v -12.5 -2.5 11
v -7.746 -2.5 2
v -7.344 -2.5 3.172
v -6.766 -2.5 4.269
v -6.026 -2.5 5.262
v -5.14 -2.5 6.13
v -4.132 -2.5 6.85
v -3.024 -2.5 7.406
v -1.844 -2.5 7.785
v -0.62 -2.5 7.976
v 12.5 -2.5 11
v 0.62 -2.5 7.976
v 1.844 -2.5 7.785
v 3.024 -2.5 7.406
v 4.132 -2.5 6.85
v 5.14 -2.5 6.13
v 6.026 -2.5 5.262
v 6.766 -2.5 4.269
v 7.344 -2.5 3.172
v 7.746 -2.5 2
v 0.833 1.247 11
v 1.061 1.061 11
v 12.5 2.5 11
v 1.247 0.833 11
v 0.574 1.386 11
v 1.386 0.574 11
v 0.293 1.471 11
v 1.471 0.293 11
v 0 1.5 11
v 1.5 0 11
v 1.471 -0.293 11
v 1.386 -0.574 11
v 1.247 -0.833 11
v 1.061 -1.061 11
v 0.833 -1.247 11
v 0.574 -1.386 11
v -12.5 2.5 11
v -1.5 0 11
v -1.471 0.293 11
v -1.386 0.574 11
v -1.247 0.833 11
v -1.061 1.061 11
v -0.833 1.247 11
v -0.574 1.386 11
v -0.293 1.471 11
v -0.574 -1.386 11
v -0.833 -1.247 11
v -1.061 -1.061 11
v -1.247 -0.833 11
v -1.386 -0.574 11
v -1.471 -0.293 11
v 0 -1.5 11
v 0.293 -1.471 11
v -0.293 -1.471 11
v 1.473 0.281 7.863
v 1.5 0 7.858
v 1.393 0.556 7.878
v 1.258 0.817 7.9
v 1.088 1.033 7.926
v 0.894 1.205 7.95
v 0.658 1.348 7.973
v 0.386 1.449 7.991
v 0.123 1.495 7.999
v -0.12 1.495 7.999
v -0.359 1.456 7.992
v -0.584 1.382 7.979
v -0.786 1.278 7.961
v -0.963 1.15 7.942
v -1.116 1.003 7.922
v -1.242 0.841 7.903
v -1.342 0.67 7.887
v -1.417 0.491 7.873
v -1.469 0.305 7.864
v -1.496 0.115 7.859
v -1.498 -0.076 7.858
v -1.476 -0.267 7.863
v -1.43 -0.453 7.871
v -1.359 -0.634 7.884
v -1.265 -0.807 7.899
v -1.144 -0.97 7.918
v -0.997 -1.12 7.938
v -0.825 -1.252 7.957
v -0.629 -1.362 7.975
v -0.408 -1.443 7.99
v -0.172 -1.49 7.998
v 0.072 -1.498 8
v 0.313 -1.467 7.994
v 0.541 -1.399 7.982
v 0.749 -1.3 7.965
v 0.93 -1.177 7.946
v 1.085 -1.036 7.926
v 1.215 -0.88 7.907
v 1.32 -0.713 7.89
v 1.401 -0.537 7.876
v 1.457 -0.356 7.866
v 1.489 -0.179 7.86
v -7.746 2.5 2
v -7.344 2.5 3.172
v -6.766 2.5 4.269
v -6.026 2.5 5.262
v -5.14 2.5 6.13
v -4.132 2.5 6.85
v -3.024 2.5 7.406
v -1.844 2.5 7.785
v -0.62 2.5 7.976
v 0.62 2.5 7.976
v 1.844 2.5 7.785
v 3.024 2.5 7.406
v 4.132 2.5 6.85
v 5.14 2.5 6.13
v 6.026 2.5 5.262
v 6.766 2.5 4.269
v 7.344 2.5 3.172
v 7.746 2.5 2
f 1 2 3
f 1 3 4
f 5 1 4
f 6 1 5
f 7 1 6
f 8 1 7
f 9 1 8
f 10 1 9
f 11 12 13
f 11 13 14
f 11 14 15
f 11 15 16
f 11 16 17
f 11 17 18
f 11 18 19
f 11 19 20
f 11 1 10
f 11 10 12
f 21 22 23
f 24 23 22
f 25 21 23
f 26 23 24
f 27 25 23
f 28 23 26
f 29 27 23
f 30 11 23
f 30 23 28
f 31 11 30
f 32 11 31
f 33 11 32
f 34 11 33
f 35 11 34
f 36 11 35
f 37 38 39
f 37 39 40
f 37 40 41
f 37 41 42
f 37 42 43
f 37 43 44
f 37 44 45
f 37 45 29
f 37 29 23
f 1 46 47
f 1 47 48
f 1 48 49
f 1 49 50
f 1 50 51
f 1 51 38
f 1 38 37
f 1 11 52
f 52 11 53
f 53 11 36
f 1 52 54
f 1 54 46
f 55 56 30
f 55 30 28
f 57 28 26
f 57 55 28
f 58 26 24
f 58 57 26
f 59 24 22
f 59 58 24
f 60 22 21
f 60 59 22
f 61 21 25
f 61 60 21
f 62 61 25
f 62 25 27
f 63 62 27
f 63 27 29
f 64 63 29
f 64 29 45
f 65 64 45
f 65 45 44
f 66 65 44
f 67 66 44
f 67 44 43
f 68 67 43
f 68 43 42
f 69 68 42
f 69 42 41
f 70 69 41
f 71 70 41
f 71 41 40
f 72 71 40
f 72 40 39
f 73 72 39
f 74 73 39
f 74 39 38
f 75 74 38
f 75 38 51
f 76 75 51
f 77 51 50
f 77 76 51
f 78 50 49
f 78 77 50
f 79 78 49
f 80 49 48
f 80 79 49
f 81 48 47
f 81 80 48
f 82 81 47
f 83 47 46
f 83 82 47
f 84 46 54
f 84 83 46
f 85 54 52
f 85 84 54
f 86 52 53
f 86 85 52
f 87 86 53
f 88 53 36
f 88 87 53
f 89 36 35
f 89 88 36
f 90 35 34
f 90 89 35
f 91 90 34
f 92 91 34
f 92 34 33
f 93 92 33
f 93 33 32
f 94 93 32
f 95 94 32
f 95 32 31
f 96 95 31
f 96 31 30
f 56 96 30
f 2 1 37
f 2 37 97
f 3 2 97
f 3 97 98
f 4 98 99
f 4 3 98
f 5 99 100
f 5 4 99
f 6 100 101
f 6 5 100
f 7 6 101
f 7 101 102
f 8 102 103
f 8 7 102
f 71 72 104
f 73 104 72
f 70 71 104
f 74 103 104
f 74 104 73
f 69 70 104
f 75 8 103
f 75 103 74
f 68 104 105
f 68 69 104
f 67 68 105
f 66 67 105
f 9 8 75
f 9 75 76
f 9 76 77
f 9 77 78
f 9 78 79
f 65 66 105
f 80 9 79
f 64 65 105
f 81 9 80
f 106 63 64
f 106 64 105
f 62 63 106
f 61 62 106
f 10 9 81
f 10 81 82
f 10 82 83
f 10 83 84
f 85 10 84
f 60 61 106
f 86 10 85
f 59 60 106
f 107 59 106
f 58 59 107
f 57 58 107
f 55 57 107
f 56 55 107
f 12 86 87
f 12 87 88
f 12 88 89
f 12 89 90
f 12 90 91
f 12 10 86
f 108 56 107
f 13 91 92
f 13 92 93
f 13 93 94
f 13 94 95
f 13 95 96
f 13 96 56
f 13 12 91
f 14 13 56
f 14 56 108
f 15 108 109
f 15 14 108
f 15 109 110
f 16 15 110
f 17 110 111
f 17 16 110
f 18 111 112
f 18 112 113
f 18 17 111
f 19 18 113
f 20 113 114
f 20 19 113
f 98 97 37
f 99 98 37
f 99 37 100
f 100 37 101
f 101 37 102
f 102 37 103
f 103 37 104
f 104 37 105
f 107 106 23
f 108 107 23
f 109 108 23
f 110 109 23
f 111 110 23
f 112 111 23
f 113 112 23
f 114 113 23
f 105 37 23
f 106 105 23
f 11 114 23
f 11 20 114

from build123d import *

# Parameters (mm, degrees)
F1_DEPTH = 2.5
F2_R     = 1.5
F3_DEPTH = 11.001


# Not quite as in the source:
# - a feature names something its author has since deleted; it is built from what else it names


with BuildPart() as f1:
    # F0 (on Front) → F1 (new body, symmetric)
    with BuildSketch(Plane.XZ):
        with BuildLine():
            Line((12.5, 11), (-12.5, 11))
            Line((-12.5, 11), (-7.7459666924, 2))
            ThreePointArc((-7.7459666924, 2), (0, 8), (7.7459666924, 2))
            Line((7.7459666924, 2), (12.5, 11))
        make_face()
    extrude(amount=F1_DEPTH, both=True)

    # F2 (on Top) → F3 (cut, through all)
    with BuildSketch(Plane.XY):
        Circle(F2_R)
    extrude(amount=F3_DEPTH, mode=Mode.SUBTRACT)


solid = f1.part
